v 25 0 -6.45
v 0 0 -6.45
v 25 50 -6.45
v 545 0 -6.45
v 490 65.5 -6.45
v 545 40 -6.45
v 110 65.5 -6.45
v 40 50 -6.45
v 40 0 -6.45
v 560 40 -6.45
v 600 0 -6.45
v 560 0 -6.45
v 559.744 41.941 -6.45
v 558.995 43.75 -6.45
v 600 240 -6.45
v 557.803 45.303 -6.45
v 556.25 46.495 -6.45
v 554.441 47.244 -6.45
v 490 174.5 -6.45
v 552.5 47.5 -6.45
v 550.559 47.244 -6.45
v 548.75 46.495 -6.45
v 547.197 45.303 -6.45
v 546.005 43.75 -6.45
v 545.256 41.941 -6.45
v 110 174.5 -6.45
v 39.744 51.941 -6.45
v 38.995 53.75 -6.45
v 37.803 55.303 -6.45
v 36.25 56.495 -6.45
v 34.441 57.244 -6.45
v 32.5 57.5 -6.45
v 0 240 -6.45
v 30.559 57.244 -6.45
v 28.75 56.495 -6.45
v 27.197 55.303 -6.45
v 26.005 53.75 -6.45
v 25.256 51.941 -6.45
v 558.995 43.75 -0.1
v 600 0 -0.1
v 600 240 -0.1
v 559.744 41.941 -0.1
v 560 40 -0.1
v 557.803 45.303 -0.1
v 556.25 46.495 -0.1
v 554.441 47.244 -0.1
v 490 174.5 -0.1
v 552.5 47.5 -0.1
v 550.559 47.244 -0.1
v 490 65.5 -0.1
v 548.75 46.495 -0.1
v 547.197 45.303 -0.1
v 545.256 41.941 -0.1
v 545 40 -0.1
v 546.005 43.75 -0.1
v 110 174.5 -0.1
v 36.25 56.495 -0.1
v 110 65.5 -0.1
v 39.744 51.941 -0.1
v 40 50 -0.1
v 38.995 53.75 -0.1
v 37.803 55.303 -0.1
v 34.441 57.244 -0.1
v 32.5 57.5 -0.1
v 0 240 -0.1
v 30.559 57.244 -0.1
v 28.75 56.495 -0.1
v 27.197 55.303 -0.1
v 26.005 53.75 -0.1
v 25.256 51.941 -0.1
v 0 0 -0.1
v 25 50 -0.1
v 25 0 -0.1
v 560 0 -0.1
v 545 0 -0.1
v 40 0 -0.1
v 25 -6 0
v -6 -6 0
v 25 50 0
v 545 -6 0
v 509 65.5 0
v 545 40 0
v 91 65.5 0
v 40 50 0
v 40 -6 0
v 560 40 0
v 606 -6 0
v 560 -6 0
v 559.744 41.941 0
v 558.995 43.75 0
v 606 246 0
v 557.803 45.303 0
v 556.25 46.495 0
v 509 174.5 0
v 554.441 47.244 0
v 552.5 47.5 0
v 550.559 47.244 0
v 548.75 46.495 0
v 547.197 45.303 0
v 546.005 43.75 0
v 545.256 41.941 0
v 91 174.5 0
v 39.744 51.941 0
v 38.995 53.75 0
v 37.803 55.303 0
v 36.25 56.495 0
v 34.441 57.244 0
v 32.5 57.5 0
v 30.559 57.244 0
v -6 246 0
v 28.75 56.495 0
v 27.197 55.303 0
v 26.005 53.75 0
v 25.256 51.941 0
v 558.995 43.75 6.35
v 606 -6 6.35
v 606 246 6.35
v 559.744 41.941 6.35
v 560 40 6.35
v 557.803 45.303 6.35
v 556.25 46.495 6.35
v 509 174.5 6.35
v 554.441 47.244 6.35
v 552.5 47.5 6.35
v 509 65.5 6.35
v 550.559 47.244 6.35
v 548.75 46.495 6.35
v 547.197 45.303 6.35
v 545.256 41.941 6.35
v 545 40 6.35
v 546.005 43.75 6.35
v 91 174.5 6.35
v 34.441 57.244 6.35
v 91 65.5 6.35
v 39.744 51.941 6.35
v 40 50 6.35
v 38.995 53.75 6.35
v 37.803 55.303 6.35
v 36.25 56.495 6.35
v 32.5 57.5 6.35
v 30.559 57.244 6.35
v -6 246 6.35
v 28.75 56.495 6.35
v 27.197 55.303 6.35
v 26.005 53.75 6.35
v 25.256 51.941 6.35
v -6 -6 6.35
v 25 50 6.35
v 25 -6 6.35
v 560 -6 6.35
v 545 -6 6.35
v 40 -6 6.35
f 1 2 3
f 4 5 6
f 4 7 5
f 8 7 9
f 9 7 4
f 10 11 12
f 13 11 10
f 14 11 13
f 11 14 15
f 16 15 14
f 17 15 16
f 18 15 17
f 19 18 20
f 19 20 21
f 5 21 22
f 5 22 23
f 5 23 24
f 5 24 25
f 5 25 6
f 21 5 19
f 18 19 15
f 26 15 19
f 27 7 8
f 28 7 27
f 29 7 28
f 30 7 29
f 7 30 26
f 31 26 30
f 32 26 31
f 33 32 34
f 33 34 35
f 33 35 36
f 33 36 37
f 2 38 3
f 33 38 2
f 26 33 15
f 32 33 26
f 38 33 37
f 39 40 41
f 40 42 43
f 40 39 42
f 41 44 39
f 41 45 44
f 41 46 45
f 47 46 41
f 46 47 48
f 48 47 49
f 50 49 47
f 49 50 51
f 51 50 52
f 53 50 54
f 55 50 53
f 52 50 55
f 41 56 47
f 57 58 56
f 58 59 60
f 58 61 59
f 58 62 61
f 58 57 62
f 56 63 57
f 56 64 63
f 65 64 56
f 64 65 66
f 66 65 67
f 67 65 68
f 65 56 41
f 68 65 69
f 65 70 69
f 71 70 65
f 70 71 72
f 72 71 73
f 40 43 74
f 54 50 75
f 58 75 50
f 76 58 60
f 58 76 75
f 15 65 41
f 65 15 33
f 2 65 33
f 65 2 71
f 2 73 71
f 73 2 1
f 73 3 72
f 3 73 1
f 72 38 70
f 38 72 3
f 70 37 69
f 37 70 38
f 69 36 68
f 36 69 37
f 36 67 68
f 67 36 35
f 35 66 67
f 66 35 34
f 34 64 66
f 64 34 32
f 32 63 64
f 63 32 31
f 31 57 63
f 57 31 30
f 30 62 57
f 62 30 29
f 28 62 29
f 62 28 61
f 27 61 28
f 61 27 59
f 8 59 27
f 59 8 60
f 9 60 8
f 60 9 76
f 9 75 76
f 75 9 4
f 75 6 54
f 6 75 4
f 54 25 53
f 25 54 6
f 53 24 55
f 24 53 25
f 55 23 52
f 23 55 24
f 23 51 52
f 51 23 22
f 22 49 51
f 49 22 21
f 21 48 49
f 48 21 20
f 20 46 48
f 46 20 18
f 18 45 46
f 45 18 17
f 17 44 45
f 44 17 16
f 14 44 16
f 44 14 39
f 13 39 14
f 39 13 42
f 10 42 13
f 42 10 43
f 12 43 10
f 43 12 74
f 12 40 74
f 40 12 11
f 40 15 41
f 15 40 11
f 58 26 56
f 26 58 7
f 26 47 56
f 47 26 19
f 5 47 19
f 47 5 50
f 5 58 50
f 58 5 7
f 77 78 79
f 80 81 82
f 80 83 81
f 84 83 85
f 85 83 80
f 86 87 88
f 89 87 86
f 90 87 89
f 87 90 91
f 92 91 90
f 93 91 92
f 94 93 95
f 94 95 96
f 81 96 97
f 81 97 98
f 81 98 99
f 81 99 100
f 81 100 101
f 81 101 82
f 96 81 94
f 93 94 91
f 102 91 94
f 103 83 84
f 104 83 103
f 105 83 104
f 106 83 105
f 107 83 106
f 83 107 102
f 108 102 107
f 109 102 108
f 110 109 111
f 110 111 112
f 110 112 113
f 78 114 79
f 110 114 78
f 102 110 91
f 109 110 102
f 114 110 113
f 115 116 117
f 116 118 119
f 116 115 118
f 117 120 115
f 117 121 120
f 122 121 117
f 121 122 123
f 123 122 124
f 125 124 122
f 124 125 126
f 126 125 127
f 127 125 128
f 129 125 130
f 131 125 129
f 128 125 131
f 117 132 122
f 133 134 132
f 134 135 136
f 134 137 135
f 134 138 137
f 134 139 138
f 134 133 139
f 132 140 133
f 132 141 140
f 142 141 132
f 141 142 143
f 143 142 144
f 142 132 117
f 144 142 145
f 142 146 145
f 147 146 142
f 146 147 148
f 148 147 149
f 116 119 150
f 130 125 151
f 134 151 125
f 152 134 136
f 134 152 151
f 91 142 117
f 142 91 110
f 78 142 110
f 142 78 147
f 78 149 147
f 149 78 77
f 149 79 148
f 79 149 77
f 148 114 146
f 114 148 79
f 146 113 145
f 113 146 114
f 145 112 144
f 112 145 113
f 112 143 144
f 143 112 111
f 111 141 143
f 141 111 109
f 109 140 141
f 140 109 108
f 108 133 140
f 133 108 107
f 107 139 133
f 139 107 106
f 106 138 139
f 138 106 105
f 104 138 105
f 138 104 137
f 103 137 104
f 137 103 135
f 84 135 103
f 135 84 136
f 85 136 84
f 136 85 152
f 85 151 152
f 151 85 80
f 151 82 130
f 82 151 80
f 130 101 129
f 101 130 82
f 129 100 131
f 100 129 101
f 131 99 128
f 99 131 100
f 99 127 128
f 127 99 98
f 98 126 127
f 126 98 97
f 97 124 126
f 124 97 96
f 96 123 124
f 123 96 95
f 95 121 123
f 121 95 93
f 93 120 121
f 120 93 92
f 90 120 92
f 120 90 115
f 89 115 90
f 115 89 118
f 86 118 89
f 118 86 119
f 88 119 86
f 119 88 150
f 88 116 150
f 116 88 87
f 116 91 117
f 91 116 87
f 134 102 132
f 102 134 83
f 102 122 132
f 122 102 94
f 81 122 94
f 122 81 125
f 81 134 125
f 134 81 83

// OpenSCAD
tank_x=600;
tank_y=240;
tank_lip=6;

light_x=418;
light_y=109;
hole_x=380;
hole_y=light_y;

light_lip=tank_lip;

inlet=15;
inlet_x=55-inlet/2;
inlet_y=55-inlet;

outlet=15;
outlet_x=40-outlet/2;
outlet_y=65-outlet;

io_lip=0;

acrylic=25.4/4;

pad=0.1;

screw_top=0;
screw_bottom=3.5;

screw_offset=20;

module dirror_x(x=0) {
	children();
	translate([x,0])
	mirror([1,0])
	children();
}

module dirror_y(y=0) {
	children();
	translate([0,y])
	mirror([0,1])
	children();
}

module acrylic() {
	linear_extrude(height=acrylic)
	children();
}

module negative(top=0, padding=0) {

	hull() {
		translate([outlet_x,outlet_y])
		circle(d=outlet+io_lip*2*top);
		translate([outlet_x,-outlet])
		circle(d=outlet+io_lip*2*top);
	}

	hull() {
		translate([tank_x-inlet_x,inlet_y])
		circle(d=inlet+io_lip*2*top);
		translate([tank_x-inlet_x,-inlet])
		circle(d=inlet+io_lip*2*top);
	}

	if(top){ 
		translate([tank_x/2,tank_y/2])
		square([
			light_x,
			light_y
		],center=true);
	} else {
		translate([tank_x/2,tank_y/2])
		square([hole_x,hole_y],center=true);
	}

	if(screw_top)
	dirror_x(tank_x)
	dirror_y(tank_y)
	translate([screw_offset,screw_offset])
	if(top) {
		circle(d=screw_top);
	} else { 
		circle(d=screw_bottom);
	}
}

module assembled() {
	color("cyan")
	translate([0,0,-acrylic-pad])
	acrylic()
	bottom();

	acrylic()
	top();
}

module bottom() {
	difference() {
		square([tank_x,tank_y]);
		negative();
	}
}

module top() {
	difference() {
		translate([-tank_lip,-tank_lip,0])
		square([tank_x+tank_lip*2,tank_y+tank_lip*2]);
		negative(1);
	}
}

assembled();
